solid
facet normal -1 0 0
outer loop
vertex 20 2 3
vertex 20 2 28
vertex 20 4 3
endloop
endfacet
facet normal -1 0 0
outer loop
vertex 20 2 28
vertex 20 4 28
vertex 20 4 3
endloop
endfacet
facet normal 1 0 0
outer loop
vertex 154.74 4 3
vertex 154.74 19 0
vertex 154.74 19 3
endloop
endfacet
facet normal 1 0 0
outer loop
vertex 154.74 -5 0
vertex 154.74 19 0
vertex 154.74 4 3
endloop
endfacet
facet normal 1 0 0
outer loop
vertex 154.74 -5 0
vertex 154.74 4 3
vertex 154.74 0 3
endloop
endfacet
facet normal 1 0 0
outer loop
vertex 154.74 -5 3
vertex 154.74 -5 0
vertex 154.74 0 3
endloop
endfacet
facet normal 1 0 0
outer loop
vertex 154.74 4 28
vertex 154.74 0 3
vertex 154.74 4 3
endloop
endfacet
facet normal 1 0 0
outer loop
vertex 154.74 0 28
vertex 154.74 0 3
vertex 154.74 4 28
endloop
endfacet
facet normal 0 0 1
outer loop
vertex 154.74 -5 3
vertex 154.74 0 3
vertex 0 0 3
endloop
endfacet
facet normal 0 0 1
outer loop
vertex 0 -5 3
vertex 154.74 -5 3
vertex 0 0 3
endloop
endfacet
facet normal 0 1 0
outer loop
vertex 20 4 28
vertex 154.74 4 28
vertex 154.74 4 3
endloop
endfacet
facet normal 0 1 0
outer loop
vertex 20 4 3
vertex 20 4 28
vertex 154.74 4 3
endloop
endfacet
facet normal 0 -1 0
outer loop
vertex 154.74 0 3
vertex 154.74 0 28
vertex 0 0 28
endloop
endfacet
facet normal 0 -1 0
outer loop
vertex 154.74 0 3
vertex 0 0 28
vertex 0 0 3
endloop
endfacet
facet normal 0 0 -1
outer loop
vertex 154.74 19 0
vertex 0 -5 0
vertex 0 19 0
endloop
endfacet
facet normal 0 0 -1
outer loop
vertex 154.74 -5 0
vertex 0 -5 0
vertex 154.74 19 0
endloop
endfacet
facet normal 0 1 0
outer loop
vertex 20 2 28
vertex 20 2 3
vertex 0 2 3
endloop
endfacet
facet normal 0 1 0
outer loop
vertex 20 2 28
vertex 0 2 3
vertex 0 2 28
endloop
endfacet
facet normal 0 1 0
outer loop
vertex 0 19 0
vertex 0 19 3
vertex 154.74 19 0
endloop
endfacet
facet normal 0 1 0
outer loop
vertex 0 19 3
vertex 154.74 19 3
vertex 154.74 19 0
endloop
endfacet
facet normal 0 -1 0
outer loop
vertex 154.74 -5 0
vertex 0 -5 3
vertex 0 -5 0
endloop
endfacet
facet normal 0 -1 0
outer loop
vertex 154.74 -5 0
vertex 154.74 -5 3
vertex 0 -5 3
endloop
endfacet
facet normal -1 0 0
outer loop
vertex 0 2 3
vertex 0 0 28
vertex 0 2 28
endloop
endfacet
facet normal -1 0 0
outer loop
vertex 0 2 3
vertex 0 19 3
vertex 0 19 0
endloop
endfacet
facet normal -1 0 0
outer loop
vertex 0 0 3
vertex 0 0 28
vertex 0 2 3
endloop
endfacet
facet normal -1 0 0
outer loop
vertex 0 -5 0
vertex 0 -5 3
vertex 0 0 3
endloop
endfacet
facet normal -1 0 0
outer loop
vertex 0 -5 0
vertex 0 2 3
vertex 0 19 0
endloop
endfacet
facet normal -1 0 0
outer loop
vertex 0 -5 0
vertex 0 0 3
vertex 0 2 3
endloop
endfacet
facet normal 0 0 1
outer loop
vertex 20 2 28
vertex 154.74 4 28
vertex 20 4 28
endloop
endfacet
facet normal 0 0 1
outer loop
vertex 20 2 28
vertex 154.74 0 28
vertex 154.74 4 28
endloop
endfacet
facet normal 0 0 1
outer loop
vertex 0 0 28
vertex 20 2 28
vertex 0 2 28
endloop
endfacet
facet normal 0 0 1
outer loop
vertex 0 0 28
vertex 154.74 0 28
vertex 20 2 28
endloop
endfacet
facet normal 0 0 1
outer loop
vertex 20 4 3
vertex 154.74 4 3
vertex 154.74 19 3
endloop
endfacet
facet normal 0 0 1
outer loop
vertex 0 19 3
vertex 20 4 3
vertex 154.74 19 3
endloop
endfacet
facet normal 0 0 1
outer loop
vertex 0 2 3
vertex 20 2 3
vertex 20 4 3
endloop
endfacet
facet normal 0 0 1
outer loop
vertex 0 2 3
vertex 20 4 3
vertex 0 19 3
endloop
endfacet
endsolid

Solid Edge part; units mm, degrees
sketch "Sketch1" plane through (0, 0, 0) normal (0, -1, 0) x (1, 0, 0)
  line L0 (154.74, 28) -> (0, 28)
  line L1 (0, 28) -> (0, 0)
  line L2 (0, 0) -> (154.74, 0)
  line L3 (154.74, 0) -> (154.74, 28)
extrude "Protrusion1" add sketch "Sketch1" against normal blind 4
sketch "Sketch2" plane through (77.37, 4, 14) normal (0, 1, 0) x (-1, 0, 0)
  line L0 (77.37, 14) -> (57.37, 14)
  line L1 (57.37, 14) -> (57.37, -14)
  line L2 (57.37, -14) -> (77.37, -14)
  line L3 (77.37, -14) -> (77.37, 14)
extrude "Recorte_Extrudado_3" cut sketch "Sketch2" against normal blind 2
sketch "Sketch3" plane through (77.37, 0, 14) normal (0, -1, 0) x (1, 0, 0)
  line L0 (77.37, -11) -> (-77.37, -11)
  line L1 (-77.37, -11) -> (-77.37, -14)
  line L2 (-77.37, -14) -> (77.37, -14)
  line L3 (77.37, -14) -> (77.37, -11)
extrude "Protrusão_Extrudada_4" add sketch "Sketch3" along normal blind 5
sketch "Sketch4" plane through (77.37, 0, 14) normal (0, -1, 0) x (1, 0, 0)
  line L0 (77.37, -11) -> (-77.37, -11)
  line L1 (-77.37, -11) -> (-77.37, -14)
  line L2 (-77.37, -14) -> (77.37, -14)
  line L3 (77.37, -14) -> (77.37, -11)
extrude "Protrusão_Extrudada_5" add sketch "Sketch4" against normal blind 19
